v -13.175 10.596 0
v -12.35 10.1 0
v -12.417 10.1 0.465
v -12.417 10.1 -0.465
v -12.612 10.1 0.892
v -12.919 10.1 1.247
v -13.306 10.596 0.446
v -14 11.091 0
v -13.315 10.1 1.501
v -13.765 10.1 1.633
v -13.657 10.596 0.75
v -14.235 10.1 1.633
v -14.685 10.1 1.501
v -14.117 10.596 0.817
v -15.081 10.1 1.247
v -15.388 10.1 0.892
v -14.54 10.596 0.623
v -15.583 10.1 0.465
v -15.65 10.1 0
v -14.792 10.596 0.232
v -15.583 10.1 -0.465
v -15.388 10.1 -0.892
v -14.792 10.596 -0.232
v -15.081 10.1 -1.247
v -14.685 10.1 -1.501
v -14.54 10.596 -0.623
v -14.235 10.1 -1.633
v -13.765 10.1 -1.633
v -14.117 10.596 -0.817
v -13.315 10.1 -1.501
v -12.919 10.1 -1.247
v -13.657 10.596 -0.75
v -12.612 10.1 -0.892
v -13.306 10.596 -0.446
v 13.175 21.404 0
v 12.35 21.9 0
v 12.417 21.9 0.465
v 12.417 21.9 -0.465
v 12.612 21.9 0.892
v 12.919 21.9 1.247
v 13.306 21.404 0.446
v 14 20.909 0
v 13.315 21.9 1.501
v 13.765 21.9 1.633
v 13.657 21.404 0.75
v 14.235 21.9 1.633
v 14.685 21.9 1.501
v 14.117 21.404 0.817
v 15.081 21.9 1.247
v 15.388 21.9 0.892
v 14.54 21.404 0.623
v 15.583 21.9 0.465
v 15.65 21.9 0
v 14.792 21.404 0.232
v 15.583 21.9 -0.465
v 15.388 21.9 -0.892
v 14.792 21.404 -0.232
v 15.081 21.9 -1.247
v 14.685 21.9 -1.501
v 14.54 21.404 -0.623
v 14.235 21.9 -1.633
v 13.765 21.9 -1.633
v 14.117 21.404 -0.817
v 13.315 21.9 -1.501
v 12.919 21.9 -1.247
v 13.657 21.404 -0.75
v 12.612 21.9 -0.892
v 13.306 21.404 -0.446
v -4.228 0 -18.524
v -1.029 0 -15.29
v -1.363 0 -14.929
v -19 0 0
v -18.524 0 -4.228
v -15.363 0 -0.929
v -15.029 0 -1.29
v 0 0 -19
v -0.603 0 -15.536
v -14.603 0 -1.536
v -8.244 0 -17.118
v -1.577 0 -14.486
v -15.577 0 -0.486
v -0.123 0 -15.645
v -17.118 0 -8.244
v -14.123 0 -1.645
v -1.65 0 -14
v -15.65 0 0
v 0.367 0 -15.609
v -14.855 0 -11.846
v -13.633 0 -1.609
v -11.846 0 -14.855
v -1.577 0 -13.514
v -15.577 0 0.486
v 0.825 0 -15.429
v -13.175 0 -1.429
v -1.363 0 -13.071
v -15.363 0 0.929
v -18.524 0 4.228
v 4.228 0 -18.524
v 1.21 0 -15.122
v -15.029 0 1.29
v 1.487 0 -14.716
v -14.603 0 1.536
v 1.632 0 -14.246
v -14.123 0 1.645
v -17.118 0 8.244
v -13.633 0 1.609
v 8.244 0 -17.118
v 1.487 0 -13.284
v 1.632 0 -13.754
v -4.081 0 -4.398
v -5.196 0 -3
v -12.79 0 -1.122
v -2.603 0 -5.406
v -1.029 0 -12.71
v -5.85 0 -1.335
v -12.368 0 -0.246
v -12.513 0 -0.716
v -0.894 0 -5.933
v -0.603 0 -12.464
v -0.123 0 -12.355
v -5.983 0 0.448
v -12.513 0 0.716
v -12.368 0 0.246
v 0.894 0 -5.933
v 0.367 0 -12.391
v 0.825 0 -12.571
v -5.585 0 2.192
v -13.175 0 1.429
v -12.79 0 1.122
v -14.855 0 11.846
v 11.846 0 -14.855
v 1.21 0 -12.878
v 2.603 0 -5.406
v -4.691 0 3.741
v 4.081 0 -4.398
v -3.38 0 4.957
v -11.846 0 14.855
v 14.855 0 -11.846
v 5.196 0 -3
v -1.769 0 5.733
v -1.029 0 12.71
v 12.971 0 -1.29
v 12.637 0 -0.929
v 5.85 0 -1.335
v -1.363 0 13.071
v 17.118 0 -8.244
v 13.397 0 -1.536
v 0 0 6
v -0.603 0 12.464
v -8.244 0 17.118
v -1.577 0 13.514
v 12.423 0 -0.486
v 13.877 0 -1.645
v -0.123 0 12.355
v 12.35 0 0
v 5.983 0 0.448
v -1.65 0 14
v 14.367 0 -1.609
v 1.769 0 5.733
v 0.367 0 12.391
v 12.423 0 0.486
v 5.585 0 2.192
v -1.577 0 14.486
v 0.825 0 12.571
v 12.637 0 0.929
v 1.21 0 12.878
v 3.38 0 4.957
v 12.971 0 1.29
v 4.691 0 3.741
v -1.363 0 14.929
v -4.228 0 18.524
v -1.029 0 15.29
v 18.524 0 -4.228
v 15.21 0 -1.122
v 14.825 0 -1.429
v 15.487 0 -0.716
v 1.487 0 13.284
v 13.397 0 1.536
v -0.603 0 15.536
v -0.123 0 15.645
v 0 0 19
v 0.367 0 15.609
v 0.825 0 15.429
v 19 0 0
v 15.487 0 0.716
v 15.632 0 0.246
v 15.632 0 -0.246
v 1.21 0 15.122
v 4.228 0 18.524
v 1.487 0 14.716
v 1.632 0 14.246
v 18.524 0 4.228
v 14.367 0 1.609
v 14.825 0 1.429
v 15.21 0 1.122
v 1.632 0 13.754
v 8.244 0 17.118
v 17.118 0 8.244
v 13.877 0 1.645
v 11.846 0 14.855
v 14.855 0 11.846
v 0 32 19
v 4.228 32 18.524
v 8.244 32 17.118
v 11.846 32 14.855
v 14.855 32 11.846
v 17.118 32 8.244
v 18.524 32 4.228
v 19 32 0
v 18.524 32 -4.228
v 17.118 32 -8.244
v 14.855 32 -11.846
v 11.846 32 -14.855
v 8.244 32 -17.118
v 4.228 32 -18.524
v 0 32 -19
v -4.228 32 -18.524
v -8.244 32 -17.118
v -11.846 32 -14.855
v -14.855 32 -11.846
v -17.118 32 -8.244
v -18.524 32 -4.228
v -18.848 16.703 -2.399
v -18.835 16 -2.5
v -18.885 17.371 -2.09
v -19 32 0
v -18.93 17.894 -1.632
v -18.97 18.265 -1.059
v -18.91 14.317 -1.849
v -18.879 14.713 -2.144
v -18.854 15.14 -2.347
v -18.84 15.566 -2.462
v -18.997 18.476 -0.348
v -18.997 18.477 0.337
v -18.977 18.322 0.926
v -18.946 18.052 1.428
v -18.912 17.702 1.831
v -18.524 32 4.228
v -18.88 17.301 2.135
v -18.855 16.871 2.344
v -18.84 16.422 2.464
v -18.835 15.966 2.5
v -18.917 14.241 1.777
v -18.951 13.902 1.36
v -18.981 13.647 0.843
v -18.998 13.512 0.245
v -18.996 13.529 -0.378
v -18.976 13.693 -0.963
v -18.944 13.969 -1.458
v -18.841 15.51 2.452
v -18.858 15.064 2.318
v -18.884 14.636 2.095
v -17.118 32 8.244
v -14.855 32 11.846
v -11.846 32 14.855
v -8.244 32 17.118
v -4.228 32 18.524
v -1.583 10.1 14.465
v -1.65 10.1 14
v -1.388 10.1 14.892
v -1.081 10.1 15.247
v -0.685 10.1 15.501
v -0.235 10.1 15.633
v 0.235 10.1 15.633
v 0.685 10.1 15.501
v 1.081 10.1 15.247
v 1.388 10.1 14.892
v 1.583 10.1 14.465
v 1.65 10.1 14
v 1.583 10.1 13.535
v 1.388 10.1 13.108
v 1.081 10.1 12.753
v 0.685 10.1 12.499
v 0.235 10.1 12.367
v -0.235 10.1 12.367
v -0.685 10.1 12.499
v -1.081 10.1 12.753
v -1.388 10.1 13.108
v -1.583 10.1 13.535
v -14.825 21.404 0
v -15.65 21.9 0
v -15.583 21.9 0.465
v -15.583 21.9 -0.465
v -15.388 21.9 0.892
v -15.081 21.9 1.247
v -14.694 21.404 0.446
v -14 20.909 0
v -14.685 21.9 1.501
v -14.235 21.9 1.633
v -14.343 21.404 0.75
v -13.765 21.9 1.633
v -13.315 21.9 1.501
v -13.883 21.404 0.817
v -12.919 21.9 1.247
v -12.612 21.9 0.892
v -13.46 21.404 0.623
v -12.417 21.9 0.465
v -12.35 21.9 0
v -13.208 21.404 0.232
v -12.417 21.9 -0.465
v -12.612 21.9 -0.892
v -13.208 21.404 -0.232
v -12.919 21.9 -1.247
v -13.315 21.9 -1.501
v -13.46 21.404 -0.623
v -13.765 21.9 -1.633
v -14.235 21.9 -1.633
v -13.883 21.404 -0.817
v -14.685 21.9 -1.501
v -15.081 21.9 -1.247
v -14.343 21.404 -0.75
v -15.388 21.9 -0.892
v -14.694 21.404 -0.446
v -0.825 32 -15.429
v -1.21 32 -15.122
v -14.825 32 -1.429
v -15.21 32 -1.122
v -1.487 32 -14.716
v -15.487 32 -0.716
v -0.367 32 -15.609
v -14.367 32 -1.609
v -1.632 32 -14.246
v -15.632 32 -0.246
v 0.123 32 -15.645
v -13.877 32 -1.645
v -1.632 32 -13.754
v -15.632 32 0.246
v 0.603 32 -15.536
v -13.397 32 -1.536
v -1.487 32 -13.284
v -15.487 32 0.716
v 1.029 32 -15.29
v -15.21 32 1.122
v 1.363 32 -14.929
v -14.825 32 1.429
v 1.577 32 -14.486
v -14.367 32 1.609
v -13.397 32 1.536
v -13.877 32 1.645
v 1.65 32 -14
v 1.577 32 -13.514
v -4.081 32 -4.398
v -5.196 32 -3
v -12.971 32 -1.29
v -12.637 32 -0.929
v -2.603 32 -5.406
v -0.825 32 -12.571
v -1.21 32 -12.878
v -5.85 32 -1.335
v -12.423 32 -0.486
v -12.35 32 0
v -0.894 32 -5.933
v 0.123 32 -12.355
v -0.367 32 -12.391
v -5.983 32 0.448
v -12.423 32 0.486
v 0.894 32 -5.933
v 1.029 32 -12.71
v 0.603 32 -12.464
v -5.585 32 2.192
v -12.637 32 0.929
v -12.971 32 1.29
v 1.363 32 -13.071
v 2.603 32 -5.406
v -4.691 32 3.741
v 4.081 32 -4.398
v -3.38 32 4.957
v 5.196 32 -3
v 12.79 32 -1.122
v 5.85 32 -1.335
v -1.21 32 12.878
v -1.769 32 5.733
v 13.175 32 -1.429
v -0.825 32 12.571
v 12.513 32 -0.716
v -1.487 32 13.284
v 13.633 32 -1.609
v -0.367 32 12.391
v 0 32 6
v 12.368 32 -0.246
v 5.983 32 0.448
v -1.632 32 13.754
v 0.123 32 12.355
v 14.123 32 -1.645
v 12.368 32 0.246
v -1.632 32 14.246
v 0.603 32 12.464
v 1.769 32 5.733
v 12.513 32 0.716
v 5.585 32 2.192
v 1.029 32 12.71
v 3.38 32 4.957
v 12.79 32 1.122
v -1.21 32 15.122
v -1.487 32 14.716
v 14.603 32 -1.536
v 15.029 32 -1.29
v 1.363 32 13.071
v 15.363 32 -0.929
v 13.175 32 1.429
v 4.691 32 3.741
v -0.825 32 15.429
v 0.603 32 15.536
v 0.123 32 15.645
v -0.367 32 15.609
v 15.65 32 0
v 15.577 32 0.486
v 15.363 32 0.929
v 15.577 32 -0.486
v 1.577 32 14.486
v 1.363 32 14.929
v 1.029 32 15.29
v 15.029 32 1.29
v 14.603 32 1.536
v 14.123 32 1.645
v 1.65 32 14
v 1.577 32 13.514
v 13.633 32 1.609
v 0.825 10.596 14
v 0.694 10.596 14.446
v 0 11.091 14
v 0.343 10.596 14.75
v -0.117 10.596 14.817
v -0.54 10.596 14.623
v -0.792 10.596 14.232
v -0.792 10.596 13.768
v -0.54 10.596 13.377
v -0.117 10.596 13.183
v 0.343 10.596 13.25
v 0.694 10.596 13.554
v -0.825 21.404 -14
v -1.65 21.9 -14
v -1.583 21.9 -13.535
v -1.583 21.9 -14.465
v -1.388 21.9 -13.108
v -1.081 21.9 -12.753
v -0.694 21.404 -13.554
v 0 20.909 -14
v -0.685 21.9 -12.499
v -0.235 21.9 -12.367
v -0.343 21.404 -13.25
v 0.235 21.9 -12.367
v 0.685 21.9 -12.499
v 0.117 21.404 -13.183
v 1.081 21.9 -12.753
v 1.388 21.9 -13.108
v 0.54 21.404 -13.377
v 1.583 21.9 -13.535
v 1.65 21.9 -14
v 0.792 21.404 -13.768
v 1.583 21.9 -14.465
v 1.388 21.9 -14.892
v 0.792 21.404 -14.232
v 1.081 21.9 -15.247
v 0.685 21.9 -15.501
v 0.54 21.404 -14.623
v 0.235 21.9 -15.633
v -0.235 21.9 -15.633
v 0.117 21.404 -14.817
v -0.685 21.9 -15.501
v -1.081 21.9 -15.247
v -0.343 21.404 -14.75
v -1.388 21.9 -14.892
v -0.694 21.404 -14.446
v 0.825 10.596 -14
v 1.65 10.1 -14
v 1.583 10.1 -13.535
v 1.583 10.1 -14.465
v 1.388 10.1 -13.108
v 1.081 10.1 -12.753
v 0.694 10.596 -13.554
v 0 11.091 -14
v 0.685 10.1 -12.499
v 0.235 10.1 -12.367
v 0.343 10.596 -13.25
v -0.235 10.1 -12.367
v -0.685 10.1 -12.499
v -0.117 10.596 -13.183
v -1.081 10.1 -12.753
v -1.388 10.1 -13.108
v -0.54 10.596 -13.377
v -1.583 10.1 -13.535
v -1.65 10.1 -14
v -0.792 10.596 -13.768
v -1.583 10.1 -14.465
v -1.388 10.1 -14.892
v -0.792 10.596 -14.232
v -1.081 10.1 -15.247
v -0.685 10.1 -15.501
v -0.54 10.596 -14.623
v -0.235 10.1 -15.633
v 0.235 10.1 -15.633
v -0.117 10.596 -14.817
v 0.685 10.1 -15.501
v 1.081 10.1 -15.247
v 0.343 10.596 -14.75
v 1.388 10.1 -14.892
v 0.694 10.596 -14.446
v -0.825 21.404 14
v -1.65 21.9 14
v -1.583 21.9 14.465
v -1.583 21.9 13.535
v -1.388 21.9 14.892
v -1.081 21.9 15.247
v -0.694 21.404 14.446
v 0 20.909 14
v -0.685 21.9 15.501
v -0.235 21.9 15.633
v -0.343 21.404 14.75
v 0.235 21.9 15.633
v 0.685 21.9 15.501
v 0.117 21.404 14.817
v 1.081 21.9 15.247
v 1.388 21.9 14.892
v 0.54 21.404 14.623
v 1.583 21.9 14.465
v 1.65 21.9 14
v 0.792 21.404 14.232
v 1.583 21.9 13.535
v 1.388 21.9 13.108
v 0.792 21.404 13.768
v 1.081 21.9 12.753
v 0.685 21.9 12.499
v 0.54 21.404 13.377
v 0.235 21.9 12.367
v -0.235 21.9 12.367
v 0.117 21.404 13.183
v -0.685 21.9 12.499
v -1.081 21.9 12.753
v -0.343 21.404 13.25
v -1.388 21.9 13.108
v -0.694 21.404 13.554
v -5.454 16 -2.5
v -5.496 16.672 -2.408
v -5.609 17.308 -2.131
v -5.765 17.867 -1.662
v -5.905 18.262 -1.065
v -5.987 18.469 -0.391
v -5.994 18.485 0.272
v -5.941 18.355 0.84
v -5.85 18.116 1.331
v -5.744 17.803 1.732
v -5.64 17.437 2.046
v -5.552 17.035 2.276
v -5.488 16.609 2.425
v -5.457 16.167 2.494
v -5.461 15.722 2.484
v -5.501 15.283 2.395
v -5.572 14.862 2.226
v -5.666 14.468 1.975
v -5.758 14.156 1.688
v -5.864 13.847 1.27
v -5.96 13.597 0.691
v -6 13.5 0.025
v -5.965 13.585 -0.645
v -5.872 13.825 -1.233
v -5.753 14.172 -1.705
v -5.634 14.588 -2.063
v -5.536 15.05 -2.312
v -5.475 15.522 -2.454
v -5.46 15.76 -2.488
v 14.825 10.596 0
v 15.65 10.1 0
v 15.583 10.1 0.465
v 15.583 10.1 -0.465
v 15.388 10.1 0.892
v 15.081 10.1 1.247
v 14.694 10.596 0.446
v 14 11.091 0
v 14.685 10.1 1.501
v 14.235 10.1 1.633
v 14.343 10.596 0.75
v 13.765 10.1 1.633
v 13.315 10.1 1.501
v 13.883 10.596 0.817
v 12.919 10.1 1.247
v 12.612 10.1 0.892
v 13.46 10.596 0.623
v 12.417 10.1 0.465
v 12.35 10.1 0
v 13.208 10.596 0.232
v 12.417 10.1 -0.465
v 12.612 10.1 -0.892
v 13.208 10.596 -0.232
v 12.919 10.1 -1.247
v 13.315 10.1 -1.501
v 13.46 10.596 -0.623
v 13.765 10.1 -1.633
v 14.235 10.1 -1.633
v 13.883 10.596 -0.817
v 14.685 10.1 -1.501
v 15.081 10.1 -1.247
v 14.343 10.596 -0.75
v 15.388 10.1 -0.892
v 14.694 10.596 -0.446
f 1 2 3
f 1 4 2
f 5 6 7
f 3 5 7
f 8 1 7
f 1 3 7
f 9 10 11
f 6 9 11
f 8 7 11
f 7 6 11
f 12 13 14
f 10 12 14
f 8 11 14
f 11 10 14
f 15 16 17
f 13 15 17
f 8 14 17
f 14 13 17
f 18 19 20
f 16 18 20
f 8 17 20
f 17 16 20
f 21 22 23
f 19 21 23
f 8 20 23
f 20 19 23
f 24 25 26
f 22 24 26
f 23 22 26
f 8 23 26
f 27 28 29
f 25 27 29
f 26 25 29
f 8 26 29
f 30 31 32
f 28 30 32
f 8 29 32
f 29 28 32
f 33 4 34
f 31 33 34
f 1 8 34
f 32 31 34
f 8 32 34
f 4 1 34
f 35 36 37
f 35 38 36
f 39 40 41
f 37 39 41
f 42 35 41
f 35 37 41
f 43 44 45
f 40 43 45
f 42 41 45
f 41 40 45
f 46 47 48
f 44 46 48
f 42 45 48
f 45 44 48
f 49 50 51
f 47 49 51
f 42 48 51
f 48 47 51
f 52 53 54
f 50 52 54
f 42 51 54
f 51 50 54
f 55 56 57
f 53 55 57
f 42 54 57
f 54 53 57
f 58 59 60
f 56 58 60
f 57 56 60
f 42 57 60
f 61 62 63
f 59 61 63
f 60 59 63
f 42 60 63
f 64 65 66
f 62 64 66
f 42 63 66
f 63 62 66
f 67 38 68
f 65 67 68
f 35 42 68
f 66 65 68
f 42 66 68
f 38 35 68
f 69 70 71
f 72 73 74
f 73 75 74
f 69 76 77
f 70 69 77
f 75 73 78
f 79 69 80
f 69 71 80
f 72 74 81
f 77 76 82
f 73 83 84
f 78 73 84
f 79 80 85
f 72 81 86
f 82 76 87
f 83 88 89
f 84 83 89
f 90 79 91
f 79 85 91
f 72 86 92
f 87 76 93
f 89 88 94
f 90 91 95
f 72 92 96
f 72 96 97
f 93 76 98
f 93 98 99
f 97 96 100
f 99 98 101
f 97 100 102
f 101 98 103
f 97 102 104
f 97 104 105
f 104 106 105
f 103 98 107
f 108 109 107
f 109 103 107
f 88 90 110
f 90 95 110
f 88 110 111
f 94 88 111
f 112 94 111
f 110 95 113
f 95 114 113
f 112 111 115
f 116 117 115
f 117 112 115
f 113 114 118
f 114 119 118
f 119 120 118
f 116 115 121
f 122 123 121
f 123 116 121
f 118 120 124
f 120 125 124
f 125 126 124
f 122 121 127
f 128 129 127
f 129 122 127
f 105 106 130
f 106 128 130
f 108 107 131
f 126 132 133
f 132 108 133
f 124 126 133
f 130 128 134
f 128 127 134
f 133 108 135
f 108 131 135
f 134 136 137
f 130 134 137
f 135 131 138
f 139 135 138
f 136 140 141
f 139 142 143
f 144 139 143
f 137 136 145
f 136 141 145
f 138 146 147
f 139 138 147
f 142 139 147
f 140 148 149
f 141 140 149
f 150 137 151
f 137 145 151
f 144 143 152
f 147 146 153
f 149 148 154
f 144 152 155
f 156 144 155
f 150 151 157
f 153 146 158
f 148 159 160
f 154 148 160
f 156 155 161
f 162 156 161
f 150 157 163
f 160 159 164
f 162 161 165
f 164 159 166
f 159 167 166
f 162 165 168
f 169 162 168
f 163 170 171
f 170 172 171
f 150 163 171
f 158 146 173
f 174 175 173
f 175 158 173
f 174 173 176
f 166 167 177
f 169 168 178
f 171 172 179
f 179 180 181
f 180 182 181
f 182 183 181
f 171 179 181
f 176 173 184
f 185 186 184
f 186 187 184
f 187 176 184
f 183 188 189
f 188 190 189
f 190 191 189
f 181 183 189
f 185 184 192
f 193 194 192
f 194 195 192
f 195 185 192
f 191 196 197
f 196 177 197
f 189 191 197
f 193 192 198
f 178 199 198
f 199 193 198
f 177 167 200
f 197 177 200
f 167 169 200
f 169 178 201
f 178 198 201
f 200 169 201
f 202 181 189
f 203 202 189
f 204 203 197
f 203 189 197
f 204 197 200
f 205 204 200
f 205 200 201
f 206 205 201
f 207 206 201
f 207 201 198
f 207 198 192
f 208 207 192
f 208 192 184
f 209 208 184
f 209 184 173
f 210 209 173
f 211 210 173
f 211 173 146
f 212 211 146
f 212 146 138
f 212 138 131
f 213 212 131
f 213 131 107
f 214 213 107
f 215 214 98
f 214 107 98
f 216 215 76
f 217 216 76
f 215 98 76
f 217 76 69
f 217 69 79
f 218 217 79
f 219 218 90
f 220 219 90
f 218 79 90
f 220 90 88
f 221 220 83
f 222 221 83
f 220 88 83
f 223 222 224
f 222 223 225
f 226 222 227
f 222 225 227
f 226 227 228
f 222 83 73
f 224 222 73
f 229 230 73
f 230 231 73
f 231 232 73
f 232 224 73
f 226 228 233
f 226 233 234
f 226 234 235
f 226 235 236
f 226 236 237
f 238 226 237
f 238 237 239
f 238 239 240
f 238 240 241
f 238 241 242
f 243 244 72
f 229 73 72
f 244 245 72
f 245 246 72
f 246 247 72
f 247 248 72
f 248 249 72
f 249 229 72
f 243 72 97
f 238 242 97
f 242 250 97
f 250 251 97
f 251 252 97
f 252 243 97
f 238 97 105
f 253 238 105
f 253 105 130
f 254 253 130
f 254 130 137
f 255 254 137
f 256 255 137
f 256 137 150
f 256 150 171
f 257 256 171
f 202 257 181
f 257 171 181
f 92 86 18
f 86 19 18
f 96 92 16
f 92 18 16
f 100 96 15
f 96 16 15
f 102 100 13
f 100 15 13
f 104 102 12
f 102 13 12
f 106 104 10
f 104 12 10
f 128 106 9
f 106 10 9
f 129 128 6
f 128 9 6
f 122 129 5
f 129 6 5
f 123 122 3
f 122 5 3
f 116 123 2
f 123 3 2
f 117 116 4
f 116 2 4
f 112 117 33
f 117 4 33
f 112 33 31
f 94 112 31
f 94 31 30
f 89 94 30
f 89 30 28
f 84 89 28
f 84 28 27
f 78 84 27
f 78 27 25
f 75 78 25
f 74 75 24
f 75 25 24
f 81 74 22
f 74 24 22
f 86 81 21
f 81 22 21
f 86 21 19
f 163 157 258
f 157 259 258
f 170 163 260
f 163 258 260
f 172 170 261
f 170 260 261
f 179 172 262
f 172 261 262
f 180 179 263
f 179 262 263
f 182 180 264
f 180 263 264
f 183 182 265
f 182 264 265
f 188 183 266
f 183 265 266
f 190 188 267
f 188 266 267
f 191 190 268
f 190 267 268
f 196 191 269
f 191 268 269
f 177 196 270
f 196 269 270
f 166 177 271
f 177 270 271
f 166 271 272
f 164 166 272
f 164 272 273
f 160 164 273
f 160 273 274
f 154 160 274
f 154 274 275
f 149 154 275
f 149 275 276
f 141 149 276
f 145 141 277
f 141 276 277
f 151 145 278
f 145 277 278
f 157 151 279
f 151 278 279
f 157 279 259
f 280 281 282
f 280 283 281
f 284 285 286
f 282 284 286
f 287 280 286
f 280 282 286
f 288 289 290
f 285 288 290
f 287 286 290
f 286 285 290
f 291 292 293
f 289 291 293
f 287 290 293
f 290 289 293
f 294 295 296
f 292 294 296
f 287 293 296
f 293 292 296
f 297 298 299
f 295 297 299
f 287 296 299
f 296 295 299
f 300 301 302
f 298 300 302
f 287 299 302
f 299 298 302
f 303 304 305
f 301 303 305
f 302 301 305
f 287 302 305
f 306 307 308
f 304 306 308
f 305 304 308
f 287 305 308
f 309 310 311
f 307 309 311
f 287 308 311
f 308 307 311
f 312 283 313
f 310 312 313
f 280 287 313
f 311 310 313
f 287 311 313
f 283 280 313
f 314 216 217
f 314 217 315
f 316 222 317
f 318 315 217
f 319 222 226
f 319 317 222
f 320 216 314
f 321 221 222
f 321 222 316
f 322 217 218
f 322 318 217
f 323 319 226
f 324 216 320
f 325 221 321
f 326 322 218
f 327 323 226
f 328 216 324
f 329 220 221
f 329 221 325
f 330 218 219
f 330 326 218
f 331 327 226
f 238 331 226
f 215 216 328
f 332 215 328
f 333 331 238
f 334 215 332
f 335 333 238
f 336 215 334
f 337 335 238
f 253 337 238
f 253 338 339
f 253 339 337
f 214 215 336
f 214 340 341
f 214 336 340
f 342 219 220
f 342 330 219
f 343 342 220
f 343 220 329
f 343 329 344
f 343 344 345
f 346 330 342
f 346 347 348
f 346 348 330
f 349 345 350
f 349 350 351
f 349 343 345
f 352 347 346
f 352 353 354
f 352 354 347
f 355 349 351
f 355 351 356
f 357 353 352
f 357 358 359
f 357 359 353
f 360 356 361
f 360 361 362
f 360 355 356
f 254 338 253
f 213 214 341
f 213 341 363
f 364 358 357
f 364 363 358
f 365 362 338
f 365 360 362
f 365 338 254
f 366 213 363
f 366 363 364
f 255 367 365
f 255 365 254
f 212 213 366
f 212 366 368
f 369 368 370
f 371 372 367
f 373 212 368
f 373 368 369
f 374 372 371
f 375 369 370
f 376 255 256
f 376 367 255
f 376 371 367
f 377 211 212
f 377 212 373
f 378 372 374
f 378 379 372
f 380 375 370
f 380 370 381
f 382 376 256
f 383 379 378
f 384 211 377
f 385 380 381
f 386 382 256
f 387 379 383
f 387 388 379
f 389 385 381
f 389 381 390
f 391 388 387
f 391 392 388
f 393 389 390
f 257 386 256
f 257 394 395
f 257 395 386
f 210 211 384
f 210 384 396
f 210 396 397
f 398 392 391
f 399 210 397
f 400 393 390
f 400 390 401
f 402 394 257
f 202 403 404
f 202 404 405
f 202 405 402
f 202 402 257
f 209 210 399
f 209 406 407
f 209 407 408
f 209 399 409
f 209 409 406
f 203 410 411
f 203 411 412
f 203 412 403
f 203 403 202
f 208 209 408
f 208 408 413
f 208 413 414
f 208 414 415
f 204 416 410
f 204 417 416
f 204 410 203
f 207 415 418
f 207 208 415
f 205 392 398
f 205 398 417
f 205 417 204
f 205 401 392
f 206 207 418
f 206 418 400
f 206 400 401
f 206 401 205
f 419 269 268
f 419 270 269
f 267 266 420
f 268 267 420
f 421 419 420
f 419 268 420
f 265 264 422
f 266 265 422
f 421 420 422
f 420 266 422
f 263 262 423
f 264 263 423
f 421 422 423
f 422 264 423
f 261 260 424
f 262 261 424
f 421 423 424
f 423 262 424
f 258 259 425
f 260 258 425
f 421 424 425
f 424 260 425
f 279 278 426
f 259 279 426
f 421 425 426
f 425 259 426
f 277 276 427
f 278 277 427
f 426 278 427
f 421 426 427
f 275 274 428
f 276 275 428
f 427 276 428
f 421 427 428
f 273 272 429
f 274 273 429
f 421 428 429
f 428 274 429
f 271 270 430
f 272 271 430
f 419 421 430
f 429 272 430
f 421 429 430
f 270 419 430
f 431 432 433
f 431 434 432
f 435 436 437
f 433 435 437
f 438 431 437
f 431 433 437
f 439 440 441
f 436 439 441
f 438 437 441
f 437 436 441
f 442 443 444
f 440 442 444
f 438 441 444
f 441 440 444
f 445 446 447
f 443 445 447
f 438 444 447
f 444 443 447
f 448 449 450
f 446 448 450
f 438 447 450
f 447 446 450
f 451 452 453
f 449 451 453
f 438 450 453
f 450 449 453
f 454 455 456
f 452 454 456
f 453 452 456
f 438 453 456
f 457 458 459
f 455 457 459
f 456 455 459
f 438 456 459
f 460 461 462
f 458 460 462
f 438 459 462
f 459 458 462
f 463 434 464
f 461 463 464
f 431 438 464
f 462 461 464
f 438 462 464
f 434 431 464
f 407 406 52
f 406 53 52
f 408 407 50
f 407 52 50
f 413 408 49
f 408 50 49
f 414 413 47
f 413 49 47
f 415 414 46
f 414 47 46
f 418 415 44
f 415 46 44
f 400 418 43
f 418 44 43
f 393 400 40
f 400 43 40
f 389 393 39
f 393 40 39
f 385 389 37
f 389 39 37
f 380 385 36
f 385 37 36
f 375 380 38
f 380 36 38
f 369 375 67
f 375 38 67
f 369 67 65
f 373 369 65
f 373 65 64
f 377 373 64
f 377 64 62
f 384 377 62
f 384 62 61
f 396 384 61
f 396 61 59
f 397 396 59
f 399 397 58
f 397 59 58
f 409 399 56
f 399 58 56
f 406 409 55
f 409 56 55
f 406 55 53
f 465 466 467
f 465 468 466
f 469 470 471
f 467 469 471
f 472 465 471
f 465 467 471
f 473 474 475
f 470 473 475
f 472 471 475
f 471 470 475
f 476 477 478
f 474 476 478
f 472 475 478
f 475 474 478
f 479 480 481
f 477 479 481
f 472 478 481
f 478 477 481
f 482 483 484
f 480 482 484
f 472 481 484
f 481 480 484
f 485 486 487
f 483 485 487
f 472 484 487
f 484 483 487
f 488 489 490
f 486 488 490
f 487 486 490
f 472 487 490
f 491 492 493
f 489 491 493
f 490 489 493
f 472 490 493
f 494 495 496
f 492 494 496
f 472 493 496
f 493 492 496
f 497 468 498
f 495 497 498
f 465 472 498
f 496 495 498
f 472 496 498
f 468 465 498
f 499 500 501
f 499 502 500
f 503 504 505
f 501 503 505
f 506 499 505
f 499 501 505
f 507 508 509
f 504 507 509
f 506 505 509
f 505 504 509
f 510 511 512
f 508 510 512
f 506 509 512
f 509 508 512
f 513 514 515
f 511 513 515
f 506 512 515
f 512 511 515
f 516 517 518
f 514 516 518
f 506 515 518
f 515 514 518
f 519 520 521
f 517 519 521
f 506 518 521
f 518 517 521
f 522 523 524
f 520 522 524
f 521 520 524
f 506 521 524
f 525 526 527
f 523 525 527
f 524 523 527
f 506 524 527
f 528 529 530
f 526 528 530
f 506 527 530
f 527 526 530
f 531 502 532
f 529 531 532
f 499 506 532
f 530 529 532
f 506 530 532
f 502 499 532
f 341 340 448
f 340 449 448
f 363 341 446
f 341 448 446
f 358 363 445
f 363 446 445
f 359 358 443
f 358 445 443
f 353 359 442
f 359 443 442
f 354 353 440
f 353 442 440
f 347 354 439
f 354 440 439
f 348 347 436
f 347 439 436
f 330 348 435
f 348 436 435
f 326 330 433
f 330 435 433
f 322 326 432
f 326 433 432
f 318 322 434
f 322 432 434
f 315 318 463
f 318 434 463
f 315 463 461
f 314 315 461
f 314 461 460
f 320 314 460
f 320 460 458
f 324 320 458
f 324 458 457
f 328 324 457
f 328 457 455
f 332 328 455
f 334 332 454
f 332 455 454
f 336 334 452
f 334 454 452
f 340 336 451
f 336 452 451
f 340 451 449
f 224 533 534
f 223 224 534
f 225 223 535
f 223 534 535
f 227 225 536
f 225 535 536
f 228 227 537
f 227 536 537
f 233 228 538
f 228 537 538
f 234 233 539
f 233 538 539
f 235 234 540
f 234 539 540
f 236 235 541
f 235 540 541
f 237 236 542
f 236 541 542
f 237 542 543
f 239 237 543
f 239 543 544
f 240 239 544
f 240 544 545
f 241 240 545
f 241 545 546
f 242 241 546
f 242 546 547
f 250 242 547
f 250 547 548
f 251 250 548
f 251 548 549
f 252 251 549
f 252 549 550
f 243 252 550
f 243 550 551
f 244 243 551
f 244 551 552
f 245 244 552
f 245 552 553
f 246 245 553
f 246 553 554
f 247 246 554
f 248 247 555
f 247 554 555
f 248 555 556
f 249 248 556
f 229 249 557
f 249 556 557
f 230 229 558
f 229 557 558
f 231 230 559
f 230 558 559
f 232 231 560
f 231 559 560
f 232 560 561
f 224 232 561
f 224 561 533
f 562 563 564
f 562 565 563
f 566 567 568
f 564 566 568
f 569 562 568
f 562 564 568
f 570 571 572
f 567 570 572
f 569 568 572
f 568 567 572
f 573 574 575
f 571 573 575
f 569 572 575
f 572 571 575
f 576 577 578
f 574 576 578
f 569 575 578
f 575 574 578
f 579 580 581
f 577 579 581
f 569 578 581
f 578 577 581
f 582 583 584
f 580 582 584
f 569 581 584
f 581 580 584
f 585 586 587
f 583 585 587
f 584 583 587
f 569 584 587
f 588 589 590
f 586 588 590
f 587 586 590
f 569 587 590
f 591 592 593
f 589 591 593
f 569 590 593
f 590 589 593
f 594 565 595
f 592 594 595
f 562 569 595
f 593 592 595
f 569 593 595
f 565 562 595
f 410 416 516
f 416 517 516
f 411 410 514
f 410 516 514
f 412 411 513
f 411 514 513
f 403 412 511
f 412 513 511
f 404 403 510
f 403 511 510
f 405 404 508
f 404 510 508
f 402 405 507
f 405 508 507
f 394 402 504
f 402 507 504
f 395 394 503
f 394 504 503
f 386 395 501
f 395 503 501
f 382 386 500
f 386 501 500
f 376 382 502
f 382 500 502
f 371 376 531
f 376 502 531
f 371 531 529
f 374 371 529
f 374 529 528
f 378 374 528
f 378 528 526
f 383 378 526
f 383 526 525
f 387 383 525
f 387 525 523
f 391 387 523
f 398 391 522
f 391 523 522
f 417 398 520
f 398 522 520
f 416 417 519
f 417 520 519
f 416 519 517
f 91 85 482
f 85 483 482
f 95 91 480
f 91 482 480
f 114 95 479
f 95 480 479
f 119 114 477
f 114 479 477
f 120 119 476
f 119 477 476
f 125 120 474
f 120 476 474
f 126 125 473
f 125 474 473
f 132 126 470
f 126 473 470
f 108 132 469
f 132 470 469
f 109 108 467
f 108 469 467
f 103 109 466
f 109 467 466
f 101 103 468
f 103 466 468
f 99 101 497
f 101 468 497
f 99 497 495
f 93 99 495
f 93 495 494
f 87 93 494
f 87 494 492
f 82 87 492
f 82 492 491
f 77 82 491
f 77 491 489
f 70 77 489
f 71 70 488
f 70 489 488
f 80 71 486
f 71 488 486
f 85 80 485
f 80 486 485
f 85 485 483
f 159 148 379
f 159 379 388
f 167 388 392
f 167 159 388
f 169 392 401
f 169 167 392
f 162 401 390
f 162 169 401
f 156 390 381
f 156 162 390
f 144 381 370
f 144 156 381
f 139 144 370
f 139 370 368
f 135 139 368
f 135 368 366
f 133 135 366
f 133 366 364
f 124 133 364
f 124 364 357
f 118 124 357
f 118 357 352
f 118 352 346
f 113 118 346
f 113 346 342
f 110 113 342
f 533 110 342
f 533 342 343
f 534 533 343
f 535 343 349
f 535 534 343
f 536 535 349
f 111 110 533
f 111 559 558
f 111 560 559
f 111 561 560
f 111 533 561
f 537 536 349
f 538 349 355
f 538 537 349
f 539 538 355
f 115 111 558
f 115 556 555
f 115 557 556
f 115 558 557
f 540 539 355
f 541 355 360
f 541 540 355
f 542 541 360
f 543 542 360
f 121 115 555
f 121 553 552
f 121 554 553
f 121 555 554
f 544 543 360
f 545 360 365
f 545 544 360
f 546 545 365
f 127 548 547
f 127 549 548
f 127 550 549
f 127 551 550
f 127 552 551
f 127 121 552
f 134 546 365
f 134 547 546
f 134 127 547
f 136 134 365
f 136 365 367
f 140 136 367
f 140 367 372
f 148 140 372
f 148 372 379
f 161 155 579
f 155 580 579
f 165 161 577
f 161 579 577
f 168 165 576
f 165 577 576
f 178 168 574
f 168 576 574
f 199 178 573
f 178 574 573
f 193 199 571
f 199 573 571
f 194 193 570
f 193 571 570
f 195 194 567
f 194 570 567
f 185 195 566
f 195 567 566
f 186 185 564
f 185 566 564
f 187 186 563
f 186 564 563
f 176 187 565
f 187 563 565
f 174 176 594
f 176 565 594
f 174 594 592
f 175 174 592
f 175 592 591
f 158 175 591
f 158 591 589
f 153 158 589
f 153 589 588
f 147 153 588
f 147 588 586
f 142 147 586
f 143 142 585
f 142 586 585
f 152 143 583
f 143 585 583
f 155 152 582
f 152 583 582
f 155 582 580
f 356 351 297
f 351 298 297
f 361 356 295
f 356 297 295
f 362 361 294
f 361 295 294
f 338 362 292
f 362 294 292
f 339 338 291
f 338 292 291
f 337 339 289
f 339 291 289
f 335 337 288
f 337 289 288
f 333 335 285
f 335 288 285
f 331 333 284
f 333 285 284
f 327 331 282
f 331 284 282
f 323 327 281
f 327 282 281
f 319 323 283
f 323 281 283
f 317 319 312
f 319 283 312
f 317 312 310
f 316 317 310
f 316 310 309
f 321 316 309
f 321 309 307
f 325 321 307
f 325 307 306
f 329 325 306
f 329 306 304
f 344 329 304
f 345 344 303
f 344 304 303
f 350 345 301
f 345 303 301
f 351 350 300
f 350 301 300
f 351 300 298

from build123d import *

# Parameters (mm, degrees)
SKETCH_1_R             = 19
SKETCH_1_R_2           = 6
EXTRUDE_1_DEPTH        = 32
SKETCH_2_R             = 2.5
CUT_EXTRUDE_1_DEPTH    = 42.785164832
HOLE_WIZARD_M4_1_D     = 3.3
HOLE_WIZARD_M4_1_DEPTH = 10.1
HOLE_WIZARD_M4_1_TIP   = 0.991420021
HOLE_WIZARD_M4_2_D     = 3.3
HOLE_WIZARD_M4_2_DEPTH = 10.1
HOLE_WIZARD_M4_2_TIP   = 0.991420021


with BuildPart() as part:
    # 草图1 → 凸台-拉伸1 (new body)
    with BuildSketch(Plane(origin=(0, 0, 0), x_dir=(1, 0, 0), z_dir=(0, 1, 0))):
        with Locations(Location((0, 0, 0), (0, 0, 270))):
            Circle(SKETCH_1_R)
        with Locations(Location((0, 0, 0), (0, 0, 270))):
            Circle(SKETCH_1_R_2, mode=Mode.SUBTRACT)
    extrude(amount=EXTRUDE_1_DEPTH)

    # 草图2 → 切除-拉伸1 (cut, through all)
    with BuildSketch(Plane(origin=(0, 0, 0), x_dir=(0, 0, -1), z_dir=(1, 0, 0))):
        with Locations((0, 16)):
            Circle(SKETCH_2_R)
    extrude(amount=-CUT_EXTRUDE_1_DEPTH, mode=Mode.SUBTRACT)

    # M4 螺纹孔1
    with Locations(Plane(origin=(0, 32, 0), x_dir=(-1, 0, 0), z_dir=(0, 1, 0))):
        with Locations((14, 0), (0, 14), (-14, 0), (0, -14)):
            Hole(HOLE_WIZARD_M4_1_D / 2, depth=HOLE_WIZARD_M4_1_DEPTH)
            with Locations((0, 0, -(HOLE_WIZARD_M4_1_DEPTH + HOLE_WIZARD_M4_1_TIP / 2))):  # 118° drill point
                Cone(0, HOLE_WIZARD_M4_1_D / 2, HOLE_WIZARD_M4_1_TIP, mode=Mode.SUBTRACT)

    # M4 螺纹孔2
    with Locations(Plane.XZ):
        with Locations((0, 14), (-14, 0), (0, -14), (14, 0)):
            Hole(HOLE_WIZARD_M4_2_D / 2, depth=HOLE_WIZARD_M4_2_DEPTH)
            with Locations((0, 0, -(HOLE_WIZARD_M4_2_DEPTH + HOLE_WIZARD_M4_2_TIP / 2))):  # 118° drill point
                Cone(0, HOLE_WIZARD_M4_2_D / 2, HOLE_WIZARD_M4_2_TIP, mode=Mode.SUBTRACT)


solid = part.part
